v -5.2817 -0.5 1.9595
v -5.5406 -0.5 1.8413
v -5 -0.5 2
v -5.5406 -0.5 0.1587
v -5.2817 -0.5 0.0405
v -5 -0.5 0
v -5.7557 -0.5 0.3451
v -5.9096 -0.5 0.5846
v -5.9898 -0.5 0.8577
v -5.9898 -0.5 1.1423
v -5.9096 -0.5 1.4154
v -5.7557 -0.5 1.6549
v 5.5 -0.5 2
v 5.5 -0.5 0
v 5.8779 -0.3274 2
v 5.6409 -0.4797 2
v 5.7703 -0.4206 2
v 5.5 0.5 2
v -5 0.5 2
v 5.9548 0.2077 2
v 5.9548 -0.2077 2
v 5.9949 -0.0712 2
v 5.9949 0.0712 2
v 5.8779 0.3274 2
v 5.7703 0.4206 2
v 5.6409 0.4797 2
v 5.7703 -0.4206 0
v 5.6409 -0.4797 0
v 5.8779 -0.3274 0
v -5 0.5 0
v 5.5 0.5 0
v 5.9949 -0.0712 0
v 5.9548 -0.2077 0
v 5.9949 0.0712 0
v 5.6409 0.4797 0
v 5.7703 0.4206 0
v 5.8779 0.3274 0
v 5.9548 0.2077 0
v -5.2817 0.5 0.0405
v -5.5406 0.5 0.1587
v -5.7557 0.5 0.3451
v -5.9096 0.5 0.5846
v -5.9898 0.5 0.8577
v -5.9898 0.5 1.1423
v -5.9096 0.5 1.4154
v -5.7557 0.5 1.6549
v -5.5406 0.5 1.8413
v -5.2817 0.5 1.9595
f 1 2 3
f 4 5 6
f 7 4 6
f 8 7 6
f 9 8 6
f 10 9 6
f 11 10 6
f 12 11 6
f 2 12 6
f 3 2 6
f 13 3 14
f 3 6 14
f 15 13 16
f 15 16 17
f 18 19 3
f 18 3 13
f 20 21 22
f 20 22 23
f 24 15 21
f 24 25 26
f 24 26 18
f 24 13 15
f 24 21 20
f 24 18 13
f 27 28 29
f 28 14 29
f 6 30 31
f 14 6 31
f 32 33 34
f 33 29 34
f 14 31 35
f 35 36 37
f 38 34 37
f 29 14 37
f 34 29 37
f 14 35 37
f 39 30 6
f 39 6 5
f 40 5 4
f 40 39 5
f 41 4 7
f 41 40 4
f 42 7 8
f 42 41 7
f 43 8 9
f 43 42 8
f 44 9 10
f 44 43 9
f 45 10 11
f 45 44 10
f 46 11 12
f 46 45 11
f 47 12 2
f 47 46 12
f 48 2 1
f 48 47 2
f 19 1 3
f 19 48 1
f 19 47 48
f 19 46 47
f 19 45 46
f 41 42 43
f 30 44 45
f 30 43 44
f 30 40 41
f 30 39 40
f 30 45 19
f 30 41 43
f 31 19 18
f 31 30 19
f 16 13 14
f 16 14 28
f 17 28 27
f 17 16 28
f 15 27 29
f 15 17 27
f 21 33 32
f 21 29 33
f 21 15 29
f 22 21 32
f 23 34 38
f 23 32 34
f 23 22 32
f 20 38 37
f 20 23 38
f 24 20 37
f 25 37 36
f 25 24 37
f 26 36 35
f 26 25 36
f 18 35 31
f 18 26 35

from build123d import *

# Parameters (mm, degrees)
SKETCH1_W           = 12
SKETCH1_H           = 1
BOSS_EXTRUDE1_DEPTH = 2
FILLET1_RADIUS      = 1
FILLET1_LENGTH      = 1
FILLET2_RADIUS      = 0.5
FILLET2_LENGTH      = 2


with BuildPart() as part:
    # Sketch1 → Boss-Extrude1 (new body)
    with BuildSketch(Plane.XY):
        Rectangle(SKETCH1_W, SKETCH1_H)
    extrude(amount=BOSS_EXTRUDE1_DEPTH)

    # Fillet1: full round fillet: the end face becomes a half cylinder, R = half its width
    fillet1_face = Plane((-6, 0, 1), x_dir=(0, 1, 0), z_dir=(-1, 0, 0))  # on the end face: x along it, z out of the body
    fillet1_slab = fillet1_face.offset(-FILLET1_RADIUS / 2) * Box(FILLET1_LENGTH, 2 * FILLET1_RADIUS, FILLET1_RADIUS, mode=Mode.PRIVATE)  # the body's end, R deep
    fillet1_round = Plane((-5, 0, 1), x_dir=(-1, 0, 0), z_dir=(0, 1, 0)) * Cylinder(FILLET1_RADIUS, FILLET1_LENGTH, mode=Mode.PRIVATE)  # its axis R under the face
    add(fillet1_slab - fillet1_round, mode=Mode.SUBTRACT)

    # Fillet2: full round fillet: the end face becomes a half cylinder, R = half its width
    fillet2_face = Plane((6, 0, 1), x_dir=(0, 0, 1), z_dir=(1, 0, 0))  # on the end face: x along it, z out of the body
    fillet2_slab = fillet2_face.offset(-FILLET2_RADIUS / 2) * Box(FILLET2_LENGTH, 2 * FILLET2_RADIUS, FILLET2_RADIUS, mode=Mode.PRIVATE)  # the body's end, R deep
    fillet2_round = Plane((5.5, 0, 1), x_dir=(1, 0, 0), z_dir=(0, 0, 1)) * Cylinder(FILLET2_RADIUS, FILLET2_LENGTH, mode=Mode.PRIVATE)  # its axis R under the face
    add(fillet2_slab - fillet2_round, mode=Mode.SUBTRACT)


solid = part.part
